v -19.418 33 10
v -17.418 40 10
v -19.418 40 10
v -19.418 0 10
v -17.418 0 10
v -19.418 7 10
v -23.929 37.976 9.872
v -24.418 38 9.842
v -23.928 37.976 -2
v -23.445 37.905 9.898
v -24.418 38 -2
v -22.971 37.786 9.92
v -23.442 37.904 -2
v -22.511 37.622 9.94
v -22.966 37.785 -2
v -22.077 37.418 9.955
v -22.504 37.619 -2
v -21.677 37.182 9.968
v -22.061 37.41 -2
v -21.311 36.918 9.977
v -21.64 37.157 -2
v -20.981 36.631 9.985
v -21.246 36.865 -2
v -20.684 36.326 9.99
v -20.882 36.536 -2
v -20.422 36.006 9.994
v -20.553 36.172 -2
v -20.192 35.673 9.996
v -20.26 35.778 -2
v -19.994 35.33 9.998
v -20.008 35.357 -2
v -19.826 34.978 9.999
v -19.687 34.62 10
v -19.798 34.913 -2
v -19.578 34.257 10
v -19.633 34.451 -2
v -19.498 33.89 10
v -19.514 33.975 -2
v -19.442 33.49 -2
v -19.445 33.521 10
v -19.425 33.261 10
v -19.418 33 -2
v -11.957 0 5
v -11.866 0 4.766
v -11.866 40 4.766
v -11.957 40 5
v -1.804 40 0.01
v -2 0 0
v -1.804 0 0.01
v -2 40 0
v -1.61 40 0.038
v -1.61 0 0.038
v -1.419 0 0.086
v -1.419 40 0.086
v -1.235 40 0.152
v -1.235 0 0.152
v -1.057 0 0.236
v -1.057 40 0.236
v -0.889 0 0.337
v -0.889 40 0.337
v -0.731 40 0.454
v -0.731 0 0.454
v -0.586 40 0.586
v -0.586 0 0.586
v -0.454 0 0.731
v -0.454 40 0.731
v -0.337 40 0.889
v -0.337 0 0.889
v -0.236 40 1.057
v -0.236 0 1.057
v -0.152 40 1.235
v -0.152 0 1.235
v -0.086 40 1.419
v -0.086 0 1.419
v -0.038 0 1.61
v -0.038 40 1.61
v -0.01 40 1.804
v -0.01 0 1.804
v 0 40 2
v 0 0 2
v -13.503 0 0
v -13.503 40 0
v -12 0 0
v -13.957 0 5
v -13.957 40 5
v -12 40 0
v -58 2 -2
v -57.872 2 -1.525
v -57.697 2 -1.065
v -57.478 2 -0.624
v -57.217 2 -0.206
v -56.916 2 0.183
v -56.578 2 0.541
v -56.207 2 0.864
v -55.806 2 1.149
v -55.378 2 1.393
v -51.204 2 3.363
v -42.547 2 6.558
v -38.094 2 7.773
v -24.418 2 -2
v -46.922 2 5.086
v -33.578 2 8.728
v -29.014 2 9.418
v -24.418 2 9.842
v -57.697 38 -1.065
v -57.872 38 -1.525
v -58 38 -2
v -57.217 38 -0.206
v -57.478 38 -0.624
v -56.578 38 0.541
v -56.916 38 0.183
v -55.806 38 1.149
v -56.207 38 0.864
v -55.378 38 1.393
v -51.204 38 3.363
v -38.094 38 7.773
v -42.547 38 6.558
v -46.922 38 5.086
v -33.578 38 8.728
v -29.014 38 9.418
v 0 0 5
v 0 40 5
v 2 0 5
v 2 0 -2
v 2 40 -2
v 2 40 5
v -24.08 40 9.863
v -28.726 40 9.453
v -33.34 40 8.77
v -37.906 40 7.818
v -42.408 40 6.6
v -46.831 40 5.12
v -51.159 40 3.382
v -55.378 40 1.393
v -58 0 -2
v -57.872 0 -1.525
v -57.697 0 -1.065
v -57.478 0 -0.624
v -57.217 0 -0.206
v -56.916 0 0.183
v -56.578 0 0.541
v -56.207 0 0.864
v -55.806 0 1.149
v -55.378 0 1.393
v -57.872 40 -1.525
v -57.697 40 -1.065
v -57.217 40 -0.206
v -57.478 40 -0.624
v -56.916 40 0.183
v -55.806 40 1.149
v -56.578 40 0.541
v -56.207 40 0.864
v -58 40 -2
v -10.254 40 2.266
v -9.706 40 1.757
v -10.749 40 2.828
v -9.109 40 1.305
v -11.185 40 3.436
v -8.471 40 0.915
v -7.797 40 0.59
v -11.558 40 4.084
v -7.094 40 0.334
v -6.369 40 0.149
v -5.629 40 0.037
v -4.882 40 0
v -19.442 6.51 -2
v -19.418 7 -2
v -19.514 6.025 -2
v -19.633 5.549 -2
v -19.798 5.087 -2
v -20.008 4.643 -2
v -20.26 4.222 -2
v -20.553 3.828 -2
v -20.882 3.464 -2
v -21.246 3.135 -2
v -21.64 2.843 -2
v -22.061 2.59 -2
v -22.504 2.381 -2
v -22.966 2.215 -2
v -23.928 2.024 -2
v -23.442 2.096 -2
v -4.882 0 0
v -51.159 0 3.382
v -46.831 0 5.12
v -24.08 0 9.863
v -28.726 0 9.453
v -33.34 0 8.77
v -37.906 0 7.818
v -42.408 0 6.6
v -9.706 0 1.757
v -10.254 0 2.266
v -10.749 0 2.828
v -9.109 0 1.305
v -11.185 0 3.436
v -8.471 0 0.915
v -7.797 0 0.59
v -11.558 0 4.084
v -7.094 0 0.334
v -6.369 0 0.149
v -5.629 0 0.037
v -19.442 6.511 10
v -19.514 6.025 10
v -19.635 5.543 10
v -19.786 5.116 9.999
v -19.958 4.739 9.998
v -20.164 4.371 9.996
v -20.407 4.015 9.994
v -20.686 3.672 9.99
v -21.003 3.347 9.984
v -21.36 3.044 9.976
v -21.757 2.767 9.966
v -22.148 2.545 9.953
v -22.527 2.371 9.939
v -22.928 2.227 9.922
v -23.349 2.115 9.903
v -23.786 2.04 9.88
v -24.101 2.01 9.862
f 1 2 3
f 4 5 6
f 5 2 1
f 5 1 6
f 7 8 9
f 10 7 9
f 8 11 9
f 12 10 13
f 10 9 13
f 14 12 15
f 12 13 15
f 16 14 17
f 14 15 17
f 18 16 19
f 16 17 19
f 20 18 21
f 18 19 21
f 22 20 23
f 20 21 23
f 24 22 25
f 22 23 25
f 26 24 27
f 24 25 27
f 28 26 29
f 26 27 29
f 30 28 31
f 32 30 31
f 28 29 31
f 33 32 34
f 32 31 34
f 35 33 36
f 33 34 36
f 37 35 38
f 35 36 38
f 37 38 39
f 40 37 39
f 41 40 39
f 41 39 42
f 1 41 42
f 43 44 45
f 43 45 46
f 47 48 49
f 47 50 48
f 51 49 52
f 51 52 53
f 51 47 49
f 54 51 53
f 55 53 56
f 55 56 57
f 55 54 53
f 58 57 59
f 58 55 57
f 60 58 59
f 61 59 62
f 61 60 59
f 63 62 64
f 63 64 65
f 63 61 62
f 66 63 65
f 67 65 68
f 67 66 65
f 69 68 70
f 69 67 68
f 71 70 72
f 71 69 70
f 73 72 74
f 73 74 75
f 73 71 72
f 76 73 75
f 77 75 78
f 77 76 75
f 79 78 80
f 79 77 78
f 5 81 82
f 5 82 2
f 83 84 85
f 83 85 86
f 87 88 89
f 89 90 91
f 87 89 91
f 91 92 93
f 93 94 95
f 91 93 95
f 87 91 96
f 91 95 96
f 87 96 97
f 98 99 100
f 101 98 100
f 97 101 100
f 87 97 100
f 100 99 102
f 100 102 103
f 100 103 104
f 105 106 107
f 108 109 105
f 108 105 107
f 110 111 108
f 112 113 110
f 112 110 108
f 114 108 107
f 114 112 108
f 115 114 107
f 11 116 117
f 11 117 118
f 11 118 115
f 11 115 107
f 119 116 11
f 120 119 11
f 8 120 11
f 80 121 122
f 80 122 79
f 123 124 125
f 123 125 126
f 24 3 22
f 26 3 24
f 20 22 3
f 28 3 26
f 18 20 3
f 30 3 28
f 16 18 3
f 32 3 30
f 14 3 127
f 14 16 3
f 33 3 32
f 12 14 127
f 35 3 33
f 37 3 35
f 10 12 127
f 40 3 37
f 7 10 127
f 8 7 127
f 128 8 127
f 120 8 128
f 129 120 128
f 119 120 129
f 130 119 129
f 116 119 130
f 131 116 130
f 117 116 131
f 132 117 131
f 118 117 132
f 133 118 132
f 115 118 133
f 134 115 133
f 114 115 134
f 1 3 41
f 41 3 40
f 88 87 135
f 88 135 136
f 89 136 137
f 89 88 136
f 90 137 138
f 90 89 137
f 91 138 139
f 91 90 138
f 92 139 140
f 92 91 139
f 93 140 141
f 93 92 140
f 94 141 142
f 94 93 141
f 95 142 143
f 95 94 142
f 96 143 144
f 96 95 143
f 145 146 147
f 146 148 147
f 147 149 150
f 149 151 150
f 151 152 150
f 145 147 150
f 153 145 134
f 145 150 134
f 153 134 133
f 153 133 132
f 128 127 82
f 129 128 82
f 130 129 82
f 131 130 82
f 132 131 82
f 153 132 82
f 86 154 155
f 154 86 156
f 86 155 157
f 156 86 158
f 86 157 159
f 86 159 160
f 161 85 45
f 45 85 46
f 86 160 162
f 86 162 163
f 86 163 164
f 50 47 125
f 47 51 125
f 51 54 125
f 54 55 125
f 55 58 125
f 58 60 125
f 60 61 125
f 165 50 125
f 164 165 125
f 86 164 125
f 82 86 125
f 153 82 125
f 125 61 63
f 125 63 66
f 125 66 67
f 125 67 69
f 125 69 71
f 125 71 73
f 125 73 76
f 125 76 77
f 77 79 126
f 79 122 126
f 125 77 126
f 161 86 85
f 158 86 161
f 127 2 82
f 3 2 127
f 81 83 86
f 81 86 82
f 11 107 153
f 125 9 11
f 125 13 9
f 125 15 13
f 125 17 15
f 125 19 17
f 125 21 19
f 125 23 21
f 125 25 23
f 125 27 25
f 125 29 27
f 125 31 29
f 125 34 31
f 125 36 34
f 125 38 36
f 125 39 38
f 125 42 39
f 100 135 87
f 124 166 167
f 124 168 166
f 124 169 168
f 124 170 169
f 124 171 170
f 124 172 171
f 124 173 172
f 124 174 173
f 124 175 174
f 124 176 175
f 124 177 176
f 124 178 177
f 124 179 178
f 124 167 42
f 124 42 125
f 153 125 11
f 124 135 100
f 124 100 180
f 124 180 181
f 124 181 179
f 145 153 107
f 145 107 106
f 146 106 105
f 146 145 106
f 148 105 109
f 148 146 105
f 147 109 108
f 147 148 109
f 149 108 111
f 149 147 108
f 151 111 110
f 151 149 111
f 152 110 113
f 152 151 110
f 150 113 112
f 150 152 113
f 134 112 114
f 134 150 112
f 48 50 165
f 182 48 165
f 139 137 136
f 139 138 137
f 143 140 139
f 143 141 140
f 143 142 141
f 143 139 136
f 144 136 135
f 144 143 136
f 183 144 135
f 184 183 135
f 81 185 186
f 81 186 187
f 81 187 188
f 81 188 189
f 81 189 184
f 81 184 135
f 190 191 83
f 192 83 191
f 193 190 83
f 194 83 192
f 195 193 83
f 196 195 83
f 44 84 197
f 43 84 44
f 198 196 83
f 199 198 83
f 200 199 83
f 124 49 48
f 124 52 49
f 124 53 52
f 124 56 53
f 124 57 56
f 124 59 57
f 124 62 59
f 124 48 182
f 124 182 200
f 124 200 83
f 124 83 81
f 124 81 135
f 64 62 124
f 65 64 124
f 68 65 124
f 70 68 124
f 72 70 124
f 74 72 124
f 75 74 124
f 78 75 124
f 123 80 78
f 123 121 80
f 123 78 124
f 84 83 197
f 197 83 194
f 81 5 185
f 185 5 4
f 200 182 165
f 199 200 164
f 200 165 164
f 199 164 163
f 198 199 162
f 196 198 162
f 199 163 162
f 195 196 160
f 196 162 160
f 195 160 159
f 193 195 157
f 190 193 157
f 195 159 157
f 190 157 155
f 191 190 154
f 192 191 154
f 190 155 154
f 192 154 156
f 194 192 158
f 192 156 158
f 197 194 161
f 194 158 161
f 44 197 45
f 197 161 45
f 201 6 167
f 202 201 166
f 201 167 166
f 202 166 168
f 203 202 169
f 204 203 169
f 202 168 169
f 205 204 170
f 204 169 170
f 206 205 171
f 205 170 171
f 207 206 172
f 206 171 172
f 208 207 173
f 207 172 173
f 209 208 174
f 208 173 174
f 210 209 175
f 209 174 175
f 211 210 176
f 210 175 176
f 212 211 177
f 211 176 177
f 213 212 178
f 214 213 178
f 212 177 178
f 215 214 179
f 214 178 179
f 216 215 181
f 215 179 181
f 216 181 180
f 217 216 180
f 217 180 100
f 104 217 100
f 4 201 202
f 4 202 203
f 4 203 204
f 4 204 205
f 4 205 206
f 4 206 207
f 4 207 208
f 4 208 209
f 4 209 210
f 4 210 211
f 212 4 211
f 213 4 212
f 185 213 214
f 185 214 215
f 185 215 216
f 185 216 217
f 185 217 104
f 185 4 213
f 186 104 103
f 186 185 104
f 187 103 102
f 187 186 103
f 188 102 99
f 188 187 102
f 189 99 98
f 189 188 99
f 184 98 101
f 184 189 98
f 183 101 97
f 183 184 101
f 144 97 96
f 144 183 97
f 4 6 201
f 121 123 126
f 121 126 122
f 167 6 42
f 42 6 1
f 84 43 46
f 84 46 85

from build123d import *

# Parameters (mm, degrees)
F1_DEPTH    = 40
F2_R        = 7.5
F3_R        = 2
F4_W        = 38.5823002379
F4_H        = 36
F5_DEPTH    = 25.4
F6_R        = 5
F7_T1_DEPTH = 16.8444406885
F7_T3_DEPTH = 16.8444406885


# Not quite as in the source:
# - a fillet or chamfer that OpenCascade refuses, or shapes differently, is made with other operations: its cross-section is extruded or revolved along the edge and cut away or added


with BuildPart() as f1:
    # F0 (on Front) → F1 (new body)
    with BuildSketch(Plane.XZ):
        with BuildLine():
            ThreePointArc((-19.4176997621, 10), (-39.3462840799, 7.4593677642), (-58, 0))
            Line((-58, 0), (-19.4176997621, 0))
            Line((-19.4176997621, 0), (-19.4176997621, 10))
        make_face()
        Polygon((0, 5), (0, 0), (-10, 0), (-11.9571349147, 5), (-13.9571349147, 5), (-12, 0), (-13.5034299327, 0), (-17.4176997621, 10), (-19.4176997621, 10), (-19.4176997621, 0), (-58, 0), (-58, -2), (2, -2), (2, 5), align=None)
    extrude(amount=-F1_DEPTH)

    # F2
    f2_edges = [f1.edges().sort_by_distance(p)[0] for p in [
        (-10, 20, 0),
    ]]
    fillet(f2_edges, radius=F2_R)

    # F3
    f3_edges = [f1.edges().sort_by_distance(p)[0] for p in [
        (0, 20, 0),
    ]]
    fillet(f3_edges, radius=F3_R)

    # F4 (on face) → F5 (cut)
    with BuildSketch(Plane.XY.offset(10)):
        with Locations((-38.7088498811, 20)):
            Rectangle(F4_W, F4_H)
    extrude(amount=-F5_DEPTH, mode=Mode.SUBTRACT)

    # F6
    f6_edges = [f1.edges().sort_by_distance(p)[0] for p in [
        (-19.4177, 2, 4),
        (-19.4177, 38, 4),
    ]]
    fillet(f6_edges, radius=F6_R)

    # F7: fillet of radius 5 on 2 edges, made by hand

    # F7_s2 → F7_t1 (cut)
    with BuildSketch(Plane.XZ.offset(-9.4222203443)):
        with BuildLine():
            ThreePointArc((-58, -2), (-57.0714339554, -0.0080127697), (-55.3783893775, 1.3933608716))
            ThreePointArc((-55.3783893775, 1.3933608716), (-56.6957053109, 0.7089301814), (-58, 0))
            Line((-58, 0), (-58, -2))
        make_face()
    extrude(amount=F7_T1_DEPTH, mode=Mode.SUBTRACT)

    # F7_s4 → F7_t3 (cut)
    with BuildSketch(Plane.XZ.offset(-47.4222203443)):
        with BuildLine():
            ThreePointArc((-58, -2), (-57.0714339554, -0.0080127697), (-55.3783893775, 1.3933608716))
            ThreePointArc((-55.3783893775, 1.3933608716), (-56.6957053109, 0.7089301814), (-58, 0))
            Line((-58, 0), (-58, -2))
        make_face()
    extrude(amount=F7_T3_DEPTH, mode=Mode.SUBTRACT)


solid = f1.part
